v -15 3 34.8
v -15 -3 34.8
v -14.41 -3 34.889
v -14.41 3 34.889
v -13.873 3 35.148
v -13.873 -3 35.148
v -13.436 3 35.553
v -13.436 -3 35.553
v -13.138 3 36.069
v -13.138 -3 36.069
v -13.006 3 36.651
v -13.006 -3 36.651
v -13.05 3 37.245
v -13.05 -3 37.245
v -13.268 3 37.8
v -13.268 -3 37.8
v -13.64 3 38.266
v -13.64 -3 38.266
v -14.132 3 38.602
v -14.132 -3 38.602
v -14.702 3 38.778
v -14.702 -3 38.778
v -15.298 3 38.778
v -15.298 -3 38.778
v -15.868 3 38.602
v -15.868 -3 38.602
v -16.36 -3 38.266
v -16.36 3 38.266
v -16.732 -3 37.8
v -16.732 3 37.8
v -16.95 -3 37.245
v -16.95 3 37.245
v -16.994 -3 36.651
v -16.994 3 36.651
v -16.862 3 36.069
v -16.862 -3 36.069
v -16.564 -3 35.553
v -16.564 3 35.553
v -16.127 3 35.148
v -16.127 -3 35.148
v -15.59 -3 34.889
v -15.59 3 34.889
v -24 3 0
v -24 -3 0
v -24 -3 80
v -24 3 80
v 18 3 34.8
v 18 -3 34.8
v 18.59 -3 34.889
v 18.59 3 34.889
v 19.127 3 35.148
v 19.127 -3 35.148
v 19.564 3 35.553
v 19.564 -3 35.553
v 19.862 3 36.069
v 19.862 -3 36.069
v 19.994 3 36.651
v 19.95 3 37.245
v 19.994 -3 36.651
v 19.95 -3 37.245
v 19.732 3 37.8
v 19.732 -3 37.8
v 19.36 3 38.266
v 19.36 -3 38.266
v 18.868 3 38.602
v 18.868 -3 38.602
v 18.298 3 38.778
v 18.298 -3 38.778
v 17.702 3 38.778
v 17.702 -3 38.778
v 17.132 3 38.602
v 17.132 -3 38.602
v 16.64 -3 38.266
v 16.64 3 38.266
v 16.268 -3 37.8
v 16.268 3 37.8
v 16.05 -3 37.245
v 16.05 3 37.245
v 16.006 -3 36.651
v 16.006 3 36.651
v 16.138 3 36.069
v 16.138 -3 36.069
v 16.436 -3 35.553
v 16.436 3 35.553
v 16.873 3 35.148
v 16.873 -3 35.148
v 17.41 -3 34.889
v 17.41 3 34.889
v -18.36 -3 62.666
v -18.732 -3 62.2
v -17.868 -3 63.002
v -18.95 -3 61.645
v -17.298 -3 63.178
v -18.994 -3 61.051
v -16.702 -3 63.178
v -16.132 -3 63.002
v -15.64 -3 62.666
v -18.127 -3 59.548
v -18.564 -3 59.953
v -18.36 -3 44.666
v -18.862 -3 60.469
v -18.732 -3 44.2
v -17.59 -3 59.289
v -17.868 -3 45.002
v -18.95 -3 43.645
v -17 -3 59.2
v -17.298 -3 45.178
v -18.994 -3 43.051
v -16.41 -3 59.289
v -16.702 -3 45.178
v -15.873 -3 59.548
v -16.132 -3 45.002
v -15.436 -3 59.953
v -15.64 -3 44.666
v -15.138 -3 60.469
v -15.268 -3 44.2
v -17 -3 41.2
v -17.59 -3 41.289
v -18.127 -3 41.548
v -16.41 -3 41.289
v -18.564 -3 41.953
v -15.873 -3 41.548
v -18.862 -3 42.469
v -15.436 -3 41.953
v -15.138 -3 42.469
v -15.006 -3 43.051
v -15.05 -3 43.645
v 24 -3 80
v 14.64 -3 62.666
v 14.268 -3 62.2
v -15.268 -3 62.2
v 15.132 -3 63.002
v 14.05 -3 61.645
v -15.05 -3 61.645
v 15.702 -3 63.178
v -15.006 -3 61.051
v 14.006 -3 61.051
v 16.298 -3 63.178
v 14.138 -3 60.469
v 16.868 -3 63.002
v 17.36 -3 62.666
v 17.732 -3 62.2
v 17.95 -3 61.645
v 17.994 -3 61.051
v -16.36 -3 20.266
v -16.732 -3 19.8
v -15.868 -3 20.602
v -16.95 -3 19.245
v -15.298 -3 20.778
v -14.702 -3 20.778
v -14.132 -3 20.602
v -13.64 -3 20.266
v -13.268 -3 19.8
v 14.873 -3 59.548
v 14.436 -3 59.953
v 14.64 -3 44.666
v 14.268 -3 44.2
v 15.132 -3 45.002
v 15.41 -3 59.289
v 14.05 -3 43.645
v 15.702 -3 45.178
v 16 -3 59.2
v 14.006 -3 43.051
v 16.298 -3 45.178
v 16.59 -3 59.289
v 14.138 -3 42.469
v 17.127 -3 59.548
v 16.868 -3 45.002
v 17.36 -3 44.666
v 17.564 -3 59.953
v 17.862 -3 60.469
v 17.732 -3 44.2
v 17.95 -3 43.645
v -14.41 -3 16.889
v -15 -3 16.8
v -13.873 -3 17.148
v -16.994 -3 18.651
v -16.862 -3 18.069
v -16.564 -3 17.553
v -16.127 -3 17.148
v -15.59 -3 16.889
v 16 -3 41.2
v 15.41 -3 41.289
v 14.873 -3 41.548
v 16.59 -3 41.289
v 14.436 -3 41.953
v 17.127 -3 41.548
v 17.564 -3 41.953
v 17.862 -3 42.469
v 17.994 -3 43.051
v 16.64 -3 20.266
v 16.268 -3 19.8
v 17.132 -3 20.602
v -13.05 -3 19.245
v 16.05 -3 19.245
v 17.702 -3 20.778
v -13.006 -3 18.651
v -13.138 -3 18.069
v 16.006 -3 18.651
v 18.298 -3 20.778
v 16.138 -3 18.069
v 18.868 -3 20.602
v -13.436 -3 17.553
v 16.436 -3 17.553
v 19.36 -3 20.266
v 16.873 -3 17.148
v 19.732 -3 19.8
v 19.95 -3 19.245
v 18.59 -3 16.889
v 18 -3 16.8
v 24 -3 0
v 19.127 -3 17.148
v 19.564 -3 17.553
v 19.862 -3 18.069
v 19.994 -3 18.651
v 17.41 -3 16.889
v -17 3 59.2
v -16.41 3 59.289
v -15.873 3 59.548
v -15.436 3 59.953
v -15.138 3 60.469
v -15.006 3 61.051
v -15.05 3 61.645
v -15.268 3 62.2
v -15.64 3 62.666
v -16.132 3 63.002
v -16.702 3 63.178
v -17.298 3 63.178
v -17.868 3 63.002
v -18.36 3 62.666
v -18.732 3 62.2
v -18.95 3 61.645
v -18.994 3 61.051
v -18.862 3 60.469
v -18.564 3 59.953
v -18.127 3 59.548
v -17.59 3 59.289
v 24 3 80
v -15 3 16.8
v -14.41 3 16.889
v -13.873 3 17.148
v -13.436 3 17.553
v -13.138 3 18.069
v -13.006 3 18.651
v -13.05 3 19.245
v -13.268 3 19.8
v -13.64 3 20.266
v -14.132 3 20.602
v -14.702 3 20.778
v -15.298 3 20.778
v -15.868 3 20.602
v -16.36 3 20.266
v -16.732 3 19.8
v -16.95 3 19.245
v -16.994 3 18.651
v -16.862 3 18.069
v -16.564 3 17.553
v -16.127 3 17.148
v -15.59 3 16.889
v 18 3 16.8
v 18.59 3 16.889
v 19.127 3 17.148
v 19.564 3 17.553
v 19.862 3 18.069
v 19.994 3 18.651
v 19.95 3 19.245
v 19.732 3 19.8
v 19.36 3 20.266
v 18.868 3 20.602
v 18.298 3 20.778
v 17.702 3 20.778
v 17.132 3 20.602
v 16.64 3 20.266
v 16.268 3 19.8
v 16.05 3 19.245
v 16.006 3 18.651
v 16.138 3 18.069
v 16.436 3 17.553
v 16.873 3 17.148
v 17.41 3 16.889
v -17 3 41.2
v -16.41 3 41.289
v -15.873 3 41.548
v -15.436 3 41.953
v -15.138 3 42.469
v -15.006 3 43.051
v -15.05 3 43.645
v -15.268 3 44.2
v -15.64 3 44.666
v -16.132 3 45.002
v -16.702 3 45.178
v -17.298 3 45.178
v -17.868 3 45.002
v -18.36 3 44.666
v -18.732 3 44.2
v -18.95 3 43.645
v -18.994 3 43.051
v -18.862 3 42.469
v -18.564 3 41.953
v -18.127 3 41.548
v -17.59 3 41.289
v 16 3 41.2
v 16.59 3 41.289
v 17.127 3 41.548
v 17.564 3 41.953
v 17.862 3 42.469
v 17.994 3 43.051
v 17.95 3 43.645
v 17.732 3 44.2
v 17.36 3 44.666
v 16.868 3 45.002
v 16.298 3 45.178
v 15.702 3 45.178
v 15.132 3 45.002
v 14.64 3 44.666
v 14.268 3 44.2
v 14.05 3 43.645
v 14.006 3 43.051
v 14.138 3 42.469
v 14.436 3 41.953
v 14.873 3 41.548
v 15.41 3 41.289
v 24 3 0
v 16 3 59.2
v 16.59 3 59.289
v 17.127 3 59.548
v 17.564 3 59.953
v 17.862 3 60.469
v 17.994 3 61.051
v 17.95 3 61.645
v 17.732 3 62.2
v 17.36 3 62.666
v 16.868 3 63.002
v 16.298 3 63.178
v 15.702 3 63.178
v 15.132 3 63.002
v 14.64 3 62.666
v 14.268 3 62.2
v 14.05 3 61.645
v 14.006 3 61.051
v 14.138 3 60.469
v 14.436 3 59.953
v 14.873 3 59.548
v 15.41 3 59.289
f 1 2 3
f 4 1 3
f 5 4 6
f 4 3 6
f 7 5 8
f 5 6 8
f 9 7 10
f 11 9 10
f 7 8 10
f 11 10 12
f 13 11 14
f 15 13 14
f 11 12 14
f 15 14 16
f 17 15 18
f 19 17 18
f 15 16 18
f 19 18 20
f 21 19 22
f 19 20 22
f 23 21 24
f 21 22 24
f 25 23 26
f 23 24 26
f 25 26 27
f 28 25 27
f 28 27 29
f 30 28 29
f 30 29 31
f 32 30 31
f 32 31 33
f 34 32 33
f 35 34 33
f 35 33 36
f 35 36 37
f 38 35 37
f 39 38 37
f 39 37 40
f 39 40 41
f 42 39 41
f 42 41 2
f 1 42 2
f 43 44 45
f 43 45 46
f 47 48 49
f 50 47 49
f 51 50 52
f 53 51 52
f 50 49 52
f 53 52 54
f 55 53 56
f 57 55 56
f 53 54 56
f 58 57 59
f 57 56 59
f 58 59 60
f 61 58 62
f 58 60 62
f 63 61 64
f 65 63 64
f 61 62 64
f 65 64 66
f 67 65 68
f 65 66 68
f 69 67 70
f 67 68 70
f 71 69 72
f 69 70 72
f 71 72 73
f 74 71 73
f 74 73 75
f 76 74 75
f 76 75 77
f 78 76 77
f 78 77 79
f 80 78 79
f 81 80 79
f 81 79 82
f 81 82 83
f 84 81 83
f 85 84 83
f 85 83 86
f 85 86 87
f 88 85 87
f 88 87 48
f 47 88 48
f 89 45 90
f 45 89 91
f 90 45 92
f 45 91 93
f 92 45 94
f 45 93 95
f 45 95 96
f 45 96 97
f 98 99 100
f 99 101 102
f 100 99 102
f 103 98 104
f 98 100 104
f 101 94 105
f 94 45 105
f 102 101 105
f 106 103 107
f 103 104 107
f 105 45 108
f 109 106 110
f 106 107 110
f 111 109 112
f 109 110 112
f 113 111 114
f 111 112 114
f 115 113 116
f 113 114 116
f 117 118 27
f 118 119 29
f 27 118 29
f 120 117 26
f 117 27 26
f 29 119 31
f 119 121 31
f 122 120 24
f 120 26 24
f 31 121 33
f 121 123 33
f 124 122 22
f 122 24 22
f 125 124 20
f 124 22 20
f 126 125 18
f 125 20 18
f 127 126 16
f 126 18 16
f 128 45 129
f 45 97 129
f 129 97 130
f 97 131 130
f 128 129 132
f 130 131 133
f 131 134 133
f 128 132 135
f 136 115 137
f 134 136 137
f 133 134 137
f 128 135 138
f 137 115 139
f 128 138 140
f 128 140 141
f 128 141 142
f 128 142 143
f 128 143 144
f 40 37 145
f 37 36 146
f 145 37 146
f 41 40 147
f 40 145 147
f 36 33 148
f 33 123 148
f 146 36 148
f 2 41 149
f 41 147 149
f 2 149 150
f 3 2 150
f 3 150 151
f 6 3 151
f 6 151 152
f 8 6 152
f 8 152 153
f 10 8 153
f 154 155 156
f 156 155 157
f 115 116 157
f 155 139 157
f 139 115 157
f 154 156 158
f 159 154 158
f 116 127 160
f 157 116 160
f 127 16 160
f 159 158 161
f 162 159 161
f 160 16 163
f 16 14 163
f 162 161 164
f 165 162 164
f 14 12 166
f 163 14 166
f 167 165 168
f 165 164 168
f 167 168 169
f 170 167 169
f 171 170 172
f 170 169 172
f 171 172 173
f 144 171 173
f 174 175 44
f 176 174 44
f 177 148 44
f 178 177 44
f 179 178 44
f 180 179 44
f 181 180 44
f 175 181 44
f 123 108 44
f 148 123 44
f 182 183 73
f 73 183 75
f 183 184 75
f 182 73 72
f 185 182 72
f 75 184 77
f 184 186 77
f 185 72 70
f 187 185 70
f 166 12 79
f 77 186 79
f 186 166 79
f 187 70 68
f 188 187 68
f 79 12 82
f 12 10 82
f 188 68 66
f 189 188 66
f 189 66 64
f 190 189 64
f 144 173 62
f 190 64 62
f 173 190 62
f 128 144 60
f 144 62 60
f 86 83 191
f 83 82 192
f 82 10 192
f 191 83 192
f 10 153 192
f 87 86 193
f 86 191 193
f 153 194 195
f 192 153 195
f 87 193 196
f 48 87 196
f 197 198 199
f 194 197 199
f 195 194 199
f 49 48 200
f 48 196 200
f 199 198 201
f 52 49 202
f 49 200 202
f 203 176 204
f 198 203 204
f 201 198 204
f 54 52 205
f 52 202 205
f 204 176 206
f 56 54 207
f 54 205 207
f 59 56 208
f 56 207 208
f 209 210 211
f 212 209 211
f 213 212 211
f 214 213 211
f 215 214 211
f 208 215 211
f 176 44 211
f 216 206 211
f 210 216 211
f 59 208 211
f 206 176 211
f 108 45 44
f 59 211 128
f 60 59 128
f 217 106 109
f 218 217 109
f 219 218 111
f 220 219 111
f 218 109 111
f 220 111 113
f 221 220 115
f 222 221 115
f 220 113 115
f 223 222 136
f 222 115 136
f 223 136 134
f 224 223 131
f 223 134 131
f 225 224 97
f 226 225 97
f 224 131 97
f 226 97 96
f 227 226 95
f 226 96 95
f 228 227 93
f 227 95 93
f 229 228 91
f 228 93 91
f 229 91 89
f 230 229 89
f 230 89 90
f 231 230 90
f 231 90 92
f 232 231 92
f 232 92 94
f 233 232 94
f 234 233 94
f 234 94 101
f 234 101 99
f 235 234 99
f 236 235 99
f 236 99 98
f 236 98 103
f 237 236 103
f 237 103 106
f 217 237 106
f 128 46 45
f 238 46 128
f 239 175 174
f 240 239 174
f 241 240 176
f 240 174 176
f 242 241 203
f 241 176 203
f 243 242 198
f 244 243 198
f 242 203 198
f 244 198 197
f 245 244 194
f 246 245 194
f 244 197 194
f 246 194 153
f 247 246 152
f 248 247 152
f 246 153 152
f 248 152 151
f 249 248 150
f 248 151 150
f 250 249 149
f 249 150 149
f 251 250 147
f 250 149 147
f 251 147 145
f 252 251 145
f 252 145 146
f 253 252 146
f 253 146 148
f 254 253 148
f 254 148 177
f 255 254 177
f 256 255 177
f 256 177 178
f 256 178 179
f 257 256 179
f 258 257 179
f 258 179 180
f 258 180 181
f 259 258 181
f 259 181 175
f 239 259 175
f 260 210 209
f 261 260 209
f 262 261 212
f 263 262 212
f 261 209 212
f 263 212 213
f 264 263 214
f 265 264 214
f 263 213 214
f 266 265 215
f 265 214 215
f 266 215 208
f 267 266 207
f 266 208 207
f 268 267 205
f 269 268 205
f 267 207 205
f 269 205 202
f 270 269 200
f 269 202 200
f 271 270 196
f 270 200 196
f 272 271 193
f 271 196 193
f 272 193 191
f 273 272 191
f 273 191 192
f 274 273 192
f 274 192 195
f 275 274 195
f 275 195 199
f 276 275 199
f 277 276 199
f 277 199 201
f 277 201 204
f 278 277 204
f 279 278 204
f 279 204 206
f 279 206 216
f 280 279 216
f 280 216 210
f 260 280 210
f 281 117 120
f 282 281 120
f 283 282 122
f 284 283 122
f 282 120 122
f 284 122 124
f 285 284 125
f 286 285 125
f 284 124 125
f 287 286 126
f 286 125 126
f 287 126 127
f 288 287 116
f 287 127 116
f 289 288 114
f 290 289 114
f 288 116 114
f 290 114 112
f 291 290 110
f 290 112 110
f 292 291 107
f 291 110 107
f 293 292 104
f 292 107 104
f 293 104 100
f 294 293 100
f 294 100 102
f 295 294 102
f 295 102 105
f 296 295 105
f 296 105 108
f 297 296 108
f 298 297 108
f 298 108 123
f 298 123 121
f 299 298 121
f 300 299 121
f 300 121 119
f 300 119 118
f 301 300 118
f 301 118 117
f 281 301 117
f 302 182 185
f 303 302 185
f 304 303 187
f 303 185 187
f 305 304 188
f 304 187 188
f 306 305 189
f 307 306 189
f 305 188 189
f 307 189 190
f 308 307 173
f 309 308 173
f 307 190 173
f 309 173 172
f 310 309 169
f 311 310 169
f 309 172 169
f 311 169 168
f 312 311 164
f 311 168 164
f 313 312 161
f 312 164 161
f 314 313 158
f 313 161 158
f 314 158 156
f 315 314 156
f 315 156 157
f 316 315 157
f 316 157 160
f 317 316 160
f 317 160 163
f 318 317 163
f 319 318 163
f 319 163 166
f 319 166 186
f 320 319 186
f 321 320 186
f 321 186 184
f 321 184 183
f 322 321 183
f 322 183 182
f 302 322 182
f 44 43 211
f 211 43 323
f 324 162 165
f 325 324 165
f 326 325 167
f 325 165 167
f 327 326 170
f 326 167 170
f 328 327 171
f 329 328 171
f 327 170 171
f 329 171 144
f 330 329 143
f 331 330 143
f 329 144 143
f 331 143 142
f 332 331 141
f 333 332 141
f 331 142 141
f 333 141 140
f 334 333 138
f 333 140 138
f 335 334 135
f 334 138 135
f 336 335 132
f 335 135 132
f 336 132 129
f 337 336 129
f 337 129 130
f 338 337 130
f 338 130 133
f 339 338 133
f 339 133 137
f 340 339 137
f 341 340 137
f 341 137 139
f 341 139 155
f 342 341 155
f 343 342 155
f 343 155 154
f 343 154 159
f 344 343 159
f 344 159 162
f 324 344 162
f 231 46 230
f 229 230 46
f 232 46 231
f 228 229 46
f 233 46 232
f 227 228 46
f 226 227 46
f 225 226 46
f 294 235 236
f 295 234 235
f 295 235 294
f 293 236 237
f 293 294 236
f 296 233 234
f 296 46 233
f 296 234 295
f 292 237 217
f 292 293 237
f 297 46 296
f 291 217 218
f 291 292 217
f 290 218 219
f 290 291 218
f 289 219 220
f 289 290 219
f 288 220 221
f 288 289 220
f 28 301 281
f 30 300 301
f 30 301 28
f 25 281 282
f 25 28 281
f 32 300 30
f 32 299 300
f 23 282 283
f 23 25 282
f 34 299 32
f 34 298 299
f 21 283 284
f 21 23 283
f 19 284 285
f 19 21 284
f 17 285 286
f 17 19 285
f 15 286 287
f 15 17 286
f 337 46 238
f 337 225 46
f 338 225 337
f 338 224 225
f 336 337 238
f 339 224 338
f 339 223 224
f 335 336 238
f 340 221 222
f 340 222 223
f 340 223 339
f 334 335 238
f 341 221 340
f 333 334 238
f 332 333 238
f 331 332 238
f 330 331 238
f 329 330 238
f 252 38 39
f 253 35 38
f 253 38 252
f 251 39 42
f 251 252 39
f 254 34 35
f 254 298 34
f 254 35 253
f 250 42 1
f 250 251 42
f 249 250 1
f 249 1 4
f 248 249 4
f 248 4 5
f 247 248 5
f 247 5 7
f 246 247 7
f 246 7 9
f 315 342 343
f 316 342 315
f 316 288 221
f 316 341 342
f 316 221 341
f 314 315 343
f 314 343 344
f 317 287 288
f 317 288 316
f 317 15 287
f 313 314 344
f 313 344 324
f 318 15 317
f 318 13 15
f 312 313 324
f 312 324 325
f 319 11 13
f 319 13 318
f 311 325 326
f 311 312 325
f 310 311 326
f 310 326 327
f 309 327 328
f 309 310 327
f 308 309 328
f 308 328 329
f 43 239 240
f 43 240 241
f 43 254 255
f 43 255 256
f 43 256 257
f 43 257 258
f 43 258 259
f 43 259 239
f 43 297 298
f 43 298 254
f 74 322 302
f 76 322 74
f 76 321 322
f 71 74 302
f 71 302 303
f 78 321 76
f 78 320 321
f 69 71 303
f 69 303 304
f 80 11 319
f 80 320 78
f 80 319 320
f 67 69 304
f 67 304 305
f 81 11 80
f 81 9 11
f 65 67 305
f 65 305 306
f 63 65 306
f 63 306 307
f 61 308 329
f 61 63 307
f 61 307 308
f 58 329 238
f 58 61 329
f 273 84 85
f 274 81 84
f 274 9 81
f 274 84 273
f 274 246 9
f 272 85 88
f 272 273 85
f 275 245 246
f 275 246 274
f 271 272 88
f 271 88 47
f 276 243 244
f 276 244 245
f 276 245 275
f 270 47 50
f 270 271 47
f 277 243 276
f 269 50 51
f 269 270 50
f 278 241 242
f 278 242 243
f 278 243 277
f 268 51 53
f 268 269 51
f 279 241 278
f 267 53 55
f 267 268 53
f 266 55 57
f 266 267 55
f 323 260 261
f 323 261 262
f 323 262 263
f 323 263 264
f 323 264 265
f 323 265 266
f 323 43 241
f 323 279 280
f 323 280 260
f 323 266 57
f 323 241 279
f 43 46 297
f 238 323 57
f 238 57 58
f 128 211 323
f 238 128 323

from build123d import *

# Parameters (mm, degrees)
CROQUIS1_W              = 48
CROQUIS1_H              = 6
SALIENTE_EXTRUIR1_DEPTH = 80
CROQUIS6_R              = 2
CORTAR_EXTRUIR4_DEPTH   = 84.737685662


with BuildPart() as part:
    # Croquis1 → Saliente-Extruir1 (new body)
    with BuildSketch(Plane.XY):
        Rectangle(CROQUIS1_W, CROQUIS1_H)
    extrude(amount=SALIENTE_EXTRUIR1_DEPTH)

    # Croquis6 → Cortar-Extruir4 (cut, through all)
    with BuildSketch(Plane.XZ.offset(3)):
        with Locations(Location((16, 61.2, 0), (0, 0, 270))):
            Circle(CROQUIS6_R)
        with Locations(Location((18, 36.8, 0), (0, 0, 270))):
            Circle(CROQUIS6_R)
        with Locations(Location((18, 18.8, 0), (0, 0, 270))):
            Circle(CROQUIS6_R)
        with Locations(Location((-17, 61.2, 0), (0, 0, 270))):
            Circle(CROQUIS6_R)
        with Locations(Location((-15, 36.8, 0), (0, 0, 270))):
            Circle(CROQUIS6_R)
        with Locations(Location((-15, 18.8, 0), (0, 0, 270))):
            Circle(CROQUIS6_R)
        with Locations(Location((-17, 43.2, 0), (0, 0, 270))):
            Circle(CROQUIS6_R)
        with Locations(Location((16, 43.2, 0), (0, 0, 270))):
            Circle(CROQUIS6_R)
    extrude(amount=-CORTAR_EXTRUIR4_DEPTH, mode=Mode.SUBTRACT)


solid = part.part
